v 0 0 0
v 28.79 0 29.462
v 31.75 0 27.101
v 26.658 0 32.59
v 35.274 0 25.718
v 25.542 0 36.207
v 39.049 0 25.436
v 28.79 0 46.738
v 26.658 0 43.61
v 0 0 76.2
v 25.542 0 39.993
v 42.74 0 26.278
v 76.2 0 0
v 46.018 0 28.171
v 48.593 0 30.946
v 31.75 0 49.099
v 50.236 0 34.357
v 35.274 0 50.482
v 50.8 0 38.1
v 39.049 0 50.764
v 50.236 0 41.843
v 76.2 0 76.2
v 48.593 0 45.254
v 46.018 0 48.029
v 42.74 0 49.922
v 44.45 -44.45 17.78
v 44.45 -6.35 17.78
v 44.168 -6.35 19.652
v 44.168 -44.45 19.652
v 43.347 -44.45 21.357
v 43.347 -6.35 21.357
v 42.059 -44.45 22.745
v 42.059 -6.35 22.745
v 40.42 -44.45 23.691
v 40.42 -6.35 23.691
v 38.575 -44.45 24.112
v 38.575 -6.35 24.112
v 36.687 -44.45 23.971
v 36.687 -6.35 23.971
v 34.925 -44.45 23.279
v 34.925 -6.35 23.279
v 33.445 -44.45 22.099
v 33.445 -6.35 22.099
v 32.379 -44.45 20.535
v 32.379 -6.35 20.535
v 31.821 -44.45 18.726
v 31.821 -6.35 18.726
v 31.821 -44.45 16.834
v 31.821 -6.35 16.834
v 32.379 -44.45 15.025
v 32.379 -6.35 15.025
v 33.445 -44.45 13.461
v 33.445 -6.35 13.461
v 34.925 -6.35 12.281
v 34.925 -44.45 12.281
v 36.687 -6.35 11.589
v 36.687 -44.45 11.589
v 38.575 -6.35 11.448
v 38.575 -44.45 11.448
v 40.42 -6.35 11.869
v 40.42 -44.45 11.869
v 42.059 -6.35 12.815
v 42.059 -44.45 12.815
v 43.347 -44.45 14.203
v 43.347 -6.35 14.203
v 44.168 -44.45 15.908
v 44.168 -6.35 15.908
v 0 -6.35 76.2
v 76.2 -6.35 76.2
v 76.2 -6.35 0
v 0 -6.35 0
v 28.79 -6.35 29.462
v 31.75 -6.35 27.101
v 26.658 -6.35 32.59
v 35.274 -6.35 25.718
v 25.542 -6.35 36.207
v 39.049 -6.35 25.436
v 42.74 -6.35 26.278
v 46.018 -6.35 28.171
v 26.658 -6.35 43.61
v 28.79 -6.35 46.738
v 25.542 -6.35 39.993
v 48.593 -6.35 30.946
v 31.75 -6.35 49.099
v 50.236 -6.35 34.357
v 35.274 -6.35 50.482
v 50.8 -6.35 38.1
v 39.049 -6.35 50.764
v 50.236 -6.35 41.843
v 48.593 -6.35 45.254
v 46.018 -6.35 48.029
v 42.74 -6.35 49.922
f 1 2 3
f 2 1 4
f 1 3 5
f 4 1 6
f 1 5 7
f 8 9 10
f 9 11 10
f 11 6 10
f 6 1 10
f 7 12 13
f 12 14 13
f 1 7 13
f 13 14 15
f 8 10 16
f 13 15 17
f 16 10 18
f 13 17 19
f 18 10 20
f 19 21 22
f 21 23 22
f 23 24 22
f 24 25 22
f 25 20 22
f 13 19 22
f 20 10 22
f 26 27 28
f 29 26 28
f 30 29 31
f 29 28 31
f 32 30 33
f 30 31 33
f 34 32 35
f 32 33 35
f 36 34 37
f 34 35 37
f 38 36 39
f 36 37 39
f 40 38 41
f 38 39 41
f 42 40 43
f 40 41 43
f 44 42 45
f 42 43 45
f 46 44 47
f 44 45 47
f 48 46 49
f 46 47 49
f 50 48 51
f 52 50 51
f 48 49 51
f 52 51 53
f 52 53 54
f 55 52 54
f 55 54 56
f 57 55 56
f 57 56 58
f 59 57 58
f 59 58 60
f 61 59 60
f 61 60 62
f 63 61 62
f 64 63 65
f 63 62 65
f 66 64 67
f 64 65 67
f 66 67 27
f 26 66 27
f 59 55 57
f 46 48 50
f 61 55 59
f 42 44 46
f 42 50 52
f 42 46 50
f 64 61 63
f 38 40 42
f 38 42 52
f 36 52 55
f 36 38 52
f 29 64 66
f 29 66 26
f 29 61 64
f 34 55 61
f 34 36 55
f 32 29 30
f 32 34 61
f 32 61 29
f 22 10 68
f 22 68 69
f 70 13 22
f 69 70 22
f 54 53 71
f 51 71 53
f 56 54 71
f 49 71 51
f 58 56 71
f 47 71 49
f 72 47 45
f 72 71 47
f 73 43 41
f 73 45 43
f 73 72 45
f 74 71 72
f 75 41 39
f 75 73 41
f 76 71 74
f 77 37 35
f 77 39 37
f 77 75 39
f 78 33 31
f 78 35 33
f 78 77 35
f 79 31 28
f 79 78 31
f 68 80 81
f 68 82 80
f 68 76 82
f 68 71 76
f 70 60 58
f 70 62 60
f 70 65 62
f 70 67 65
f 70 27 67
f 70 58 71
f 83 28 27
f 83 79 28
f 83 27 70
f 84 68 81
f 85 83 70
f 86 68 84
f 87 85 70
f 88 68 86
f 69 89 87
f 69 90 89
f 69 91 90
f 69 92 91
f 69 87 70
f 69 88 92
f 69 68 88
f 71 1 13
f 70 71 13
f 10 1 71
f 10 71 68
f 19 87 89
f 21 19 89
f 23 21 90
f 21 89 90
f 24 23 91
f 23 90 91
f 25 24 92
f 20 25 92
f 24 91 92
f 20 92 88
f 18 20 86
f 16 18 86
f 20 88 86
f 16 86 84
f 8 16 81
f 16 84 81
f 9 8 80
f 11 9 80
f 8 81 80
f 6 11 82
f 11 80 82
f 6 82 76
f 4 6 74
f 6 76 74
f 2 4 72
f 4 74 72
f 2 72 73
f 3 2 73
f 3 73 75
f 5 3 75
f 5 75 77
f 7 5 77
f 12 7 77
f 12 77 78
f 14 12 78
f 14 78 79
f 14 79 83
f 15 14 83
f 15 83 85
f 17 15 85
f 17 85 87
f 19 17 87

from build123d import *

# Parameters (mm, degrees)
F0_W     = 76.2
F0_H     = 76.2
F1_DEPTH = 6.35
F2_R     = 12.7
F3_DEPTH = 25.4
F4_R     = 6.35
F5_DEPTH = 38.1


with BuildPart() as f1:
    # F0 (on Front) → F1 (new body)
    with BuildSketch(Plane.XZ):
        with Locations((38.1, 38.1)):
            Rectangle(F0_W, F0_H)
    extrude(amount=F1_DEPTH)

    # F2 (on face) → F3 (cut)
    with BuildSketch(Plane.XZ.offset(6.35)):
        with Locations((38.1, 38.1)):
            Circle(F2_R)
    extrude(amount=-F3_DEPTH, mode=Mode.SUBTRACT)

    # F4 (on face) → F5 (join)
    with BuildSketch(Plane.XZ.offset(6.35)):
        with Locations((38.1, 17.78)):
            Circle(F4_R)
    extrude(amount=F5_DEPTH)


solid = f1.part
